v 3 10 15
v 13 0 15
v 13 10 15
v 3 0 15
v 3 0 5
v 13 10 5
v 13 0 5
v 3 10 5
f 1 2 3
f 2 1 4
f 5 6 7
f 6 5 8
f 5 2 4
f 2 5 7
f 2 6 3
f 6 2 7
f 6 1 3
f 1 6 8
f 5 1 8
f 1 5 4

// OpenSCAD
// Generated by scadwright. Do not hand-edit —
// edit the Python source and regenerate.

color("red") {
    translate([3, 0, 5]) {
        cube([10, 10, 10], center=false);
    }
}
